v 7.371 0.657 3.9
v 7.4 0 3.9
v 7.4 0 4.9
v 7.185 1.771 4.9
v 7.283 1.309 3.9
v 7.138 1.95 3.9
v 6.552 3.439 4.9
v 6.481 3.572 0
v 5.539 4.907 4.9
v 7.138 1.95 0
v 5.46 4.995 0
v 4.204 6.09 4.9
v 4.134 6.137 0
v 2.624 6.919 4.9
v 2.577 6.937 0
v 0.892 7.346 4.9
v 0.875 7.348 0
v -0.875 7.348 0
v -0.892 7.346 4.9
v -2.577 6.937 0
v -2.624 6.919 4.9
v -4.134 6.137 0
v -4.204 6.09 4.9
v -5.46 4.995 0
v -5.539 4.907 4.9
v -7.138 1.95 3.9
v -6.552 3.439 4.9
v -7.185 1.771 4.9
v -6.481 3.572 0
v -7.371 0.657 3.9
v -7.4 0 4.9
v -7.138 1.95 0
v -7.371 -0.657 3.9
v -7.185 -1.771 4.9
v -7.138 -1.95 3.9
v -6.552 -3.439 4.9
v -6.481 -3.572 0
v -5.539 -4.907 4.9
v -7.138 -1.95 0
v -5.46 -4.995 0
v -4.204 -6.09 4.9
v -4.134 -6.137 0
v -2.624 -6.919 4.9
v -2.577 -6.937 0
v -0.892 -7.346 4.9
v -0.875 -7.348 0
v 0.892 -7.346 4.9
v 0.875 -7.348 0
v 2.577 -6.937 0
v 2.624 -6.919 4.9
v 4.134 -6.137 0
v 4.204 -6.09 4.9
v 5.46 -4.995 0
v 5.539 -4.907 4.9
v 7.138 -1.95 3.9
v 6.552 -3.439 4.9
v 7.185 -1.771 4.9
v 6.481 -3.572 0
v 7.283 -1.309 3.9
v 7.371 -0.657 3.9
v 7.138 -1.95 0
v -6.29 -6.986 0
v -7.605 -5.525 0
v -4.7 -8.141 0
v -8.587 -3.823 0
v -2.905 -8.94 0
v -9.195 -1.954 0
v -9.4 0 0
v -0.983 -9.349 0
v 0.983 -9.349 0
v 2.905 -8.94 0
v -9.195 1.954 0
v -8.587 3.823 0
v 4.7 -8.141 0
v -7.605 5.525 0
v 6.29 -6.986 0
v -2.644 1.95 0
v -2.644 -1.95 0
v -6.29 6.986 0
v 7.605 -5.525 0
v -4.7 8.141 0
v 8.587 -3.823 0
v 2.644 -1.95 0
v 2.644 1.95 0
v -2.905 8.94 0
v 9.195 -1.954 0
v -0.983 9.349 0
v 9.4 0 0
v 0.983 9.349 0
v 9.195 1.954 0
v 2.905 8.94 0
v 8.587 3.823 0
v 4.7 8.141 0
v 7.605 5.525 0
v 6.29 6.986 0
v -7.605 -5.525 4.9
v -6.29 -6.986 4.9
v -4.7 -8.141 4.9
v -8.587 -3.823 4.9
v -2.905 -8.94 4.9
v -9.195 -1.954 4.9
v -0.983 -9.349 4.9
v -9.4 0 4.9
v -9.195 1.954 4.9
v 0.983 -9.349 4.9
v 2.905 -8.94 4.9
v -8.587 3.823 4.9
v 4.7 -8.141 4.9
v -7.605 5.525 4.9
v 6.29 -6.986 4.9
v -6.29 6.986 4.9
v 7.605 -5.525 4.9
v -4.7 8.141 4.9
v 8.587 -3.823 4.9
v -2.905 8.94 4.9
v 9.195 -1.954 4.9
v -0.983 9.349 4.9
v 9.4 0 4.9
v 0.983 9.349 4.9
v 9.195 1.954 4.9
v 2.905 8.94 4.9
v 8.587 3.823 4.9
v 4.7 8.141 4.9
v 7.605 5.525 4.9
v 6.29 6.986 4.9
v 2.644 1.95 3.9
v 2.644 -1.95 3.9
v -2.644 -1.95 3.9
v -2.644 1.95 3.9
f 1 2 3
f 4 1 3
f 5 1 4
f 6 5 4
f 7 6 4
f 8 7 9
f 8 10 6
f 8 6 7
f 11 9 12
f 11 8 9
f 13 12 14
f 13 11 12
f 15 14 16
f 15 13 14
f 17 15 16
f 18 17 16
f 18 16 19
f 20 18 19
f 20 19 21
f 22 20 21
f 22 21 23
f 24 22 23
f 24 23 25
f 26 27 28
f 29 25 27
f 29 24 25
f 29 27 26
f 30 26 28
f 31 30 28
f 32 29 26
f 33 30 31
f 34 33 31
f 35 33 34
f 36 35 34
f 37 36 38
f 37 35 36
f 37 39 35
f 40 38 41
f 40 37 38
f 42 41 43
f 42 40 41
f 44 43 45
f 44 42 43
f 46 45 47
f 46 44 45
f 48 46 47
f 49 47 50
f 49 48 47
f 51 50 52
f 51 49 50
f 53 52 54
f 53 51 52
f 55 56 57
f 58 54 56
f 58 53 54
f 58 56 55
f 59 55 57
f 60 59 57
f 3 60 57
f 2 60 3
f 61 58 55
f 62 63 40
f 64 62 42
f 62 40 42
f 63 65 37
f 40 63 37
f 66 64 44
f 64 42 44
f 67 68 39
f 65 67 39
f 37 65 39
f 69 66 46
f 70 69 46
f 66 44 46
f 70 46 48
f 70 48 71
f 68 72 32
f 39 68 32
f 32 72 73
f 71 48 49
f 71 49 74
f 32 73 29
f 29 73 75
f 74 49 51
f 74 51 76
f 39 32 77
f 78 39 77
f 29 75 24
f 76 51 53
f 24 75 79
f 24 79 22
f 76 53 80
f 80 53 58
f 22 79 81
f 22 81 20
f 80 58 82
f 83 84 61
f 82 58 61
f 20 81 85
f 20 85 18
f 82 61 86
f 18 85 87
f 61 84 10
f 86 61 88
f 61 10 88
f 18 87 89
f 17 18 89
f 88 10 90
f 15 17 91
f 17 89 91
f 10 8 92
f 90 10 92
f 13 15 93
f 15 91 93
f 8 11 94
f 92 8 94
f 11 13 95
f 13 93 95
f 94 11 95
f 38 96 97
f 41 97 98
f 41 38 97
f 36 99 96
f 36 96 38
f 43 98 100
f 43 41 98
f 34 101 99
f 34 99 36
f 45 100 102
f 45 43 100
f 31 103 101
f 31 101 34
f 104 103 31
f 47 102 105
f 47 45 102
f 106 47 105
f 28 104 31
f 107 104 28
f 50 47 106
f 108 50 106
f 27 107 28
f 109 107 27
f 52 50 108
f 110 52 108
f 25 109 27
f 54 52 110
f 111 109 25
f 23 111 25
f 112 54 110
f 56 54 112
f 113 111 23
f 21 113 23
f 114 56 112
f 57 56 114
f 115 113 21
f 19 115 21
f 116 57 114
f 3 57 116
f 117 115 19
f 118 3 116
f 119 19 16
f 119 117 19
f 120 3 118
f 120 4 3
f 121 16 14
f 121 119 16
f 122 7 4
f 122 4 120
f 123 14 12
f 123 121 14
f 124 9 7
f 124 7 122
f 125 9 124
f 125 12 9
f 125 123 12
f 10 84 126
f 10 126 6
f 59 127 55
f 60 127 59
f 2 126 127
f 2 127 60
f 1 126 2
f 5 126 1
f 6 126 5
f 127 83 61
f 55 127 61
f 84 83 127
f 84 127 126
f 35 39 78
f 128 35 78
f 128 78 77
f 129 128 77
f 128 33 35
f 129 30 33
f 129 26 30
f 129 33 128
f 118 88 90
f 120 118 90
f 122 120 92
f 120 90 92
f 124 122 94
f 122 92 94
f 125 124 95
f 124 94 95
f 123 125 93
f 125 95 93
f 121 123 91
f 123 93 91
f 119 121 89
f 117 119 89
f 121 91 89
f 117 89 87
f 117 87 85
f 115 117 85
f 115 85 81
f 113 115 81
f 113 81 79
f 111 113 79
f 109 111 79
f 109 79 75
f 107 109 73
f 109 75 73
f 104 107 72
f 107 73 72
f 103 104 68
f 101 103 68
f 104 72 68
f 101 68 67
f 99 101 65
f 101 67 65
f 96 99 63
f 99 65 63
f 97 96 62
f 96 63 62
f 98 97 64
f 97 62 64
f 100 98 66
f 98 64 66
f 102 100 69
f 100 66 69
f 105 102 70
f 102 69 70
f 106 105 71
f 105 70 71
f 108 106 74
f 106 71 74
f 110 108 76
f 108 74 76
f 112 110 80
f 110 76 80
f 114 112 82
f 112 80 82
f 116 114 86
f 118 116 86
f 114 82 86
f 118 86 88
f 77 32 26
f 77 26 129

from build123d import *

# Parameters (mm, degrees)
SKETCH_1_R        = 9.4
SKETCH_1_R_2      = 7.4
EXTRUDE_1_DEPTH   = 4.9
SKETCH_2_W        = 5.498524857
SKETCH_2_H        = 3.9
EXTRUDE_1_2_DEPTH = 3.9


with BuildPart() as part:
    # 草图1 → Extrude 1 (new body)
    with BuildSketch(Plane.XY):
        Circle(SKETCH_1_R)
        Circle(SKETCH_1_R_2, mode=Mode.SUBTRACT)
    extrude(amount=EXTRUDE_1_DEPTH)

    # 草图2 → Extrude 1 2 (add)
    with BuildSketch(Plane.XY):
        with Locations((5.39294726, 0)):
            Rectangle(SKETCH_2_W, SKETCH_2_H)
        with Locations((-5.39294726, 0)):
            Rectangle(SKETCH_2_W, SKETCH_2_H)
    extrude(amount=EXTRUDE_1_2_DEPTH)


solid = part.part
